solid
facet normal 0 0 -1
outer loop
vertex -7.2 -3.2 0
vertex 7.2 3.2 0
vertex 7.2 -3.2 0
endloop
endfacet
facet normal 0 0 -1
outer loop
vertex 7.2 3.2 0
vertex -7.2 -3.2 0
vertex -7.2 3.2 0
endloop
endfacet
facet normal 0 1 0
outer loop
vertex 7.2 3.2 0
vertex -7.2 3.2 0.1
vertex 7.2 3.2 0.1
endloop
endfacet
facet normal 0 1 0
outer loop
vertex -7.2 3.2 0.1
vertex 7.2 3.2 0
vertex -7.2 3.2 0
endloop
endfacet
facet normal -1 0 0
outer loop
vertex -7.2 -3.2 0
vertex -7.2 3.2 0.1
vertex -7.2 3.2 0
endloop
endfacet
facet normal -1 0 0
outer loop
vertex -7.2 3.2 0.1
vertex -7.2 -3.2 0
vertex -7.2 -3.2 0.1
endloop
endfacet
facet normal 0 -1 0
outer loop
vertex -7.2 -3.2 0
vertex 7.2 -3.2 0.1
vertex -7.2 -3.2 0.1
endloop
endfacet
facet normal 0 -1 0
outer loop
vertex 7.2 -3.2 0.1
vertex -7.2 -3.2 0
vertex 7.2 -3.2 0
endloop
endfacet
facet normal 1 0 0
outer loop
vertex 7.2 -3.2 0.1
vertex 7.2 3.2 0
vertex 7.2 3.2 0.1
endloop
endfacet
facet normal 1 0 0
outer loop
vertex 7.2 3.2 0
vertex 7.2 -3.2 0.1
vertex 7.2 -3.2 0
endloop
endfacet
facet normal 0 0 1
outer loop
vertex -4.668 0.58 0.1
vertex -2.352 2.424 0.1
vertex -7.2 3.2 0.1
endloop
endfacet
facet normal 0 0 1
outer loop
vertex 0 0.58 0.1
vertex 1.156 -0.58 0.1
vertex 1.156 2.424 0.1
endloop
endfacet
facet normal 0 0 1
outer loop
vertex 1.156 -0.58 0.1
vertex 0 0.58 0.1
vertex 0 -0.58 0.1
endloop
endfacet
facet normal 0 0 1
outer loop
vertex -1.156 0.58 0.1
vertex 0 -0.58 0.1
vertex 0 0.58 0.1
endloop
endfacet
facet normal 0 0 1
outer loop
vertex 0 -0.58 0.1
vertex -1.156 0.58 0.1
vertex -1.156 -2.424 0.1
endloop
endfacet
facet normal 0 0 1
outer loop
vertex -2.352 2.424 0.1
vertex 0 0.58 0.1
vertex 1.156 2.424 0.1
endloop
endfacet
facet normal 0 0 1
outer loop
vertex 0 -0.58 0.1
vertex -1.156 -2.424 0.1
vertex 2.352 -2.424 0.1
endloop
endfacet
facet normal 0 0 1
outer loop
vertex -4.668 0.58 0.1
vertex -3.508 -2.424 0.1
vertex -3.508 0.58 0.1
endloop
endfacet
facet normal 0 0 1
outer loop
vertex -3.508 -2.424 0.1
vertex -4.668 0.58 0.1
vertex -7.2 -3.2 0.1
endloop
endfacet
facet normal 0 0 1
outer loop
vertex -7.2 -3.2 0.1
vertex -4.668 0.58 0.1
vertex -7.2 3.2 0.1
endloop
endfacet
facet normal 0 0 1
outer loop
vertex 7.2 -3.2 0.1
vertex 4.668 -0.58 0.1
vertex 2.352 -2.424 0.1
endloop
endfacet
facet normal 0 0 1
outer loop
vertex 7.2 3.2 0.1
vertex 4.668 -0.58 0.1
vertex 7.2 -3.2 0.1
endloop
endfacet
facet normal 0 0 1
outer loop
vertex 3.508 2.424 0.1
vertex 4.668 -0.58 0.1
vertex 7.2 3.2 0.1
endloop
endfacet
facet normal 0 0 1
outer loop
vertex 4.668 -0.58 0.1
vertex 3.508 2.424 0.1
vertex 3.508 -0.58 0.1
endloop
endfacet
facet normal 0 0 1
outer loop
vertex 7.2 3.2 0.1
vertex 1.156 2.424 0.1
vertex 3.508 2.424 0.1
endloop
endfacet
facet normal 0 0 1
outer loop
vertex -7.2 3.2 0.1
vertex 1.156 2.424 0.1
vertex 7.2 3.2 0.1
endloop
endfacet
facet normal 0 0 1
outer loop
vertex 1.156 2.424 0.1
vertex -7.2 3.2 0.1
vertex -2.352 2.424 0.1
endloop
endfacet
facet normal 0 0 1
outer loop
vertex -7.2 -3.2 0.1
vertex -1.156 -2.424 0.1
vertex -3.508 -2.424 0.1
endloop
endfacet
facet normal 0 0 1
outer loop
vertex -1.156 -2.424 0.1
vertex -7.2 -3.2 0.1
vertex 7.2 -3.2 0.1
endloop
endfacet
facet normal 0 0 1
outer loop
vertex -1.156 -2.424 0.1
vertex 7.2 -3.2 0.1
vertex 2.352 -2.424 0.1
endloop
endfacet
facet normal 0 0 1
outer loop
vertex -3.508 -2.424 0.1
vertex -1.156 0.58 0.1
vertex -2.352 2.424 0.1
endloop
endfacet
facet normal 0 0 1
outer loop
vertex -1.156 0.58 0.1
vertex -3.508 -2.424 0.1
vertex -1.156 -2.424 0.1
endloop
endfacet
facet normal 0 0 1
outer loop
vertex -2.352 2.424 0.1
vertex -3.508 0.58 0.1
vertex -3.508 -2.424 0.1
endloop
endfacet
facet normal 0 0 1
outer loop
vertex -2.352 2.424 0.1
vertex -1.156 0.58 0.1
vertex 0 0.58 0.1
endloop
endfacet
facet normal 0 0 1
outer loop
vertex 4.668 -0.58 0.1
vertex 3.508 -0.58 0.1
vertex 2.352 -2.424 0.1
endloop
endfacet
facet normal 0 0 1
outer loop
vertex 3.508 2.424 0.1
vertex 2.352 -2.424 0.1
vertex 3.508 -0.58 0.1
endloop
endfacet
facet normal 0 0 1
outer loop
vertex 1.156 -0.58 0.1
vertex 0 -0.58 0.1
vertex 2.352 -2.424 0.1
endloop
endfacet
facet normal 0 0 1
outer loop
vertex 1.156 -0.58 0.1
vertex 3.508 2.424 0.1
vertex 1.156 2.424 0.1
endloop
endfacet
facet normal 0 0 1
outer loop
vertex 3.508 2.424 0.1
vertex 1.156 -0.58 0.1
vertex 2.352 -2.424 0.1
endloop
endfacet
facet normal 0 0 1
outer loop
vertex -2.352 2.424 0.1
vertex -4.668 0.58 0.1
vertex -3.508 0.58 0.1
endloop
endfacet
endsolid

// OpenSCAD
// file: ../p/box5-12.scad
use <../lib.scad>
function ldraw_lib__box5_12() = [
// 0 Box with 5 Faces without Any Edges
// 0 Name: box5-12.dat
// 0 Author: Chris Dee [cwdee]
// 0 !LDRAW_ORG Primitive UPDATE 2009-02
// 0 !LICENSE Licensed under CC BY 4.0 : see CAreadme.txt
// 
// 0 BFC CERTIFY CCW
  [0,"BFC","CERTIFY"],
  [0,"BFC","CCW"],
// 
// 0 !HISTORY 2009-09-03 [PTadmin] Official Update 2009-02
// 
// 
// 4 16 1 1 1 1 1 -1 -1 1 -1 -1 1 1
  [4,16,1,1,1,1,1,-1,-1,1,-1,-1,1,1],
// 4 16 -1 0 1 1 0 1 1 1 1 -1 1 1
  [4,16,-1,0,1,1,0,1,1,1,1,-1,1,1],
// 4 16 -1 0 -1 -1 0 1 -1 1 1 -1 1 -1
  [4,16,-1,0,-1,-1,0,1,-1,1,1,-1,1,-1],
// 4 16 1 0 -1 -1 0 -1 -1 1 -1 1 1 -1
  [4,16,1,0,-1,-1,0,-1,-1,1,-1,1,1,-1],
// 4 16 1 0 1 1 0 -1 1 1 -1 1 1 1
  [4,16,1,0,1,1,0,-1,1,1,-1,1,1,1],
// 0
];
module ldraw_lib__box5_12(step=0, col=false, unit=2/5, alt=false, line=0.2, solid=!$preview)
    makepoly(ldraw_lib__box5_12(), step=step, col=col, unit=unit, alt=alt, line=line, solid=solid);
ldraw_lib__box5_12(line=0.2);
// main file
use <../lib.scad>
use <../p/box5-12.scad>
function ldraw_lib__821577i() = [
// 0 Sticker  0.8 x  1.8 with Green Up and Down Arrows
// 0 Name: 821577i.dat
// 0 Author: Evert-Jan Boer [ejboer]
// 0 !LDRAW_ORG Part UPDATE 2026-07
// 0 !LICENSE Licensed under CC BY 4.0 : see CAreadme.txt
// 
// 0 BFC CERTIFY CCW
  [0,"BFC","CERTIFY"],
  [0,"BFC","CCW"],
// 
// 0 !CATEGORY Sticker
// 0 !KEYWORDS Multi Control, Set 8082
// 
// 0 !HISTORY 2026-07-30 [OrionP] Official Update 2026-07
// 
// 1 16 0 -.25 0 18 0 0 0 0.25 0 0 0 8 box5-12.dat
  [1,16,0,-.25,0,18,0,0,0,0.25,0,0,0,8, ldraw_lib__box5_12()],
// 3 16 -11.67 -.25 1.45 -5.88 -.25 6.06 -18 -.25 8
  [3,16,-11.67,-.25,1.45,-5.88,-.25,6.06,-18,-.25,8],
// 4 16 0 -.25 1.45 0 -.25 -1.45 2.89 -.25 -1.45 2.89 -.25 6.06
  [4,16,0,-.25,1.45,0,-.25,-1.45,2.89,-.25,-1.45,2.89,-.25,6.06],
// 4 16 0 -.25 -1.45 0 -.25 1.45 -2.89 -.25 1.45 -2.89 -.25 -6.06
  [4,16,0,-.25,-1.45,0,-.25,1.45,-2.89,-.25,1.45,-2.89,-.25,-6.06],
// 3 16 -5.88 -.25 6.06 0 -.25 1.45 2.89 -.25 6.06
  [3,16,-5.88,-.25,6.06,0,-.25,1.45,2.89,-.25,6.06],
// 3 16 0 -.25 -1.45 -2.89 -.25 -6.06 5.88 -.25 -6.06
  [3,16,0,-.25,-1.45,-2.89,-.25,-6.06,5.88,-.25,-6.06],
// 4 16 -8.77 -.25 -6.06 -8.77 -.25 1.45 -11.67 -.25 1.45 -18 -.25 -8
  [4,16,-8.77,-.25,-6.06,-8.77,-.25,1.45,-11.67,-.25,1.45,-18,-.25,-8],
// 3 16 -18 -.25 -8 -11.67 -.25 1.45 -18 -.25 8
  [3,16,-18,-.25,-8,-11.67,-.25,1.45,-18,-.25,8],
// 3 16 18 -.25 -8 11.67 -.25 -1.45 5.88 -.25 -6.06
  [3,16,18,-.25,-8,11.67,-.25,-1.45,5.88,-.25,-6.06],
// 3 16 18 -.25 8 11.67 -.25 -1.45 18 -.25 -8
  [3,16,18,-.25,8,11.67,-.25,-1.45,18,-.25,-8],
// 4 16 8.77 -.25 6.06 8.77 -.25 -1.45 11.67 -.25 -1.45 18 -.25 8
  [4,16,8.77,-.25,6.06,8.77,-.25,-1.45,11.67,-.25,-1.45,18,-.25,8],
// 3 16 18 -.25 8 2.89 -.25 6.06 8.77 -.25 6.06
  [3,16,18,-.25,8,2.89,-.25,6.06,8.77,-.25,6.06],
// 4 16 -18 -.25 8 -5.88 -.25 6.06 2.89 -.25 6.06 18 -.25 8
  [4,16,-18,-.25,8,-5.88,-.25,6.06,2.89,-.25,6.06,18,-.25,8],
// 4 16 18 -.25 -8 -2.89 -.25 -6.06 -8.77 -.25 -6.06 -18 -.25 -8
  [4,16,18,-.25,-8,-2.89,-.25,-6.06,-8.77,-.25,-6.06,-18,-.25,-8],
// 3 16 -2.89 -.25 -6.06 18 -.25 -8 5.88 -.25 -6.06
  [3,16,-2.89,-.25,-6.06,18,-.25,-8,5.88,-.25,-6.06],
// 
// 0 BFC NOCLIP
  [0,"BFC","NOCLIP"],
// 
// 4 2 -2.89 -.25 -6.06 -2.89 -.25 1.45 -5.88 -.25 6.06 -8.77 -.25 -6.06
  [4,2,-2.89,-.25,-6.06,-2.89,-.25,1.45,-5.88,-.25,6.06,-8.77,-.25,-6.06],
// 3 2 -5.88 -.25 6.06 -8.77 -.25 1.45 -8.77 -.25 -6.06
  [3,2,-5.88,-.25,6.06,-8.77,-.25,1.45,-8.77,-.25,-6.06],
// 3 2 -5.88 -.25 6.06 -2.89 -.25 1.45 0 -.25 1.45
  [3,2,-5.88,-.25,6.06,-2.89,-.25,1.45,0,-.25,1.45],
// 3 2 11.67 -.25 -1.45 8.77 -.25 -1.45 5.88 -.25 -6.06
  [3,2,11.67,-.25,-1.45,8.77,-.25,-1.45,5.88,-.25,-6.06],
// 3 2 8.77 -.25 6.06 5.88 -.25 -6.06 8.77 -.25 -1.45
  [3,2,8.77,-.25,6.06,5.88,-.25,-6.06,8.77,-.25,-1.45],
// 3 2 2.89 -.25 -1.45 0 -.25 -1.45 5.88 -.25 -6.06
  [3,2,2.89,-.25,-1.45,0,-.25,-1.45,5.88,-.25,-6.06],
// 4 2 5.88 -.25 -6.06 8.77 -.25 6.06 2.89 -.25 6.06 2.89 -.25 -1.45
  [4,2,5.88,-.25,-6.06,8.77,-.25,6.06,2.89,-.25,6.06,2.89,-.25,-1.45],
// 3 2 -5.88 -.25 6.06 -11.67 -.25 1.45 -8.77 -.25 1.45
  [3,2,-5.88,-.25,6.06,-11.67,-.25,1.45,-8.77,-.25,1.45],
];
module ldraw_lib__821577i(step=0, col=false, unit=2/5, alt=false, line=0.2, solid=!$preview)
    makepoly(ldraw_lib__821577i(), step=step, col=col, unit=unit, alt=alt, line=line, solid=solid);
ldraw_lib__821577i(line=0.2);
